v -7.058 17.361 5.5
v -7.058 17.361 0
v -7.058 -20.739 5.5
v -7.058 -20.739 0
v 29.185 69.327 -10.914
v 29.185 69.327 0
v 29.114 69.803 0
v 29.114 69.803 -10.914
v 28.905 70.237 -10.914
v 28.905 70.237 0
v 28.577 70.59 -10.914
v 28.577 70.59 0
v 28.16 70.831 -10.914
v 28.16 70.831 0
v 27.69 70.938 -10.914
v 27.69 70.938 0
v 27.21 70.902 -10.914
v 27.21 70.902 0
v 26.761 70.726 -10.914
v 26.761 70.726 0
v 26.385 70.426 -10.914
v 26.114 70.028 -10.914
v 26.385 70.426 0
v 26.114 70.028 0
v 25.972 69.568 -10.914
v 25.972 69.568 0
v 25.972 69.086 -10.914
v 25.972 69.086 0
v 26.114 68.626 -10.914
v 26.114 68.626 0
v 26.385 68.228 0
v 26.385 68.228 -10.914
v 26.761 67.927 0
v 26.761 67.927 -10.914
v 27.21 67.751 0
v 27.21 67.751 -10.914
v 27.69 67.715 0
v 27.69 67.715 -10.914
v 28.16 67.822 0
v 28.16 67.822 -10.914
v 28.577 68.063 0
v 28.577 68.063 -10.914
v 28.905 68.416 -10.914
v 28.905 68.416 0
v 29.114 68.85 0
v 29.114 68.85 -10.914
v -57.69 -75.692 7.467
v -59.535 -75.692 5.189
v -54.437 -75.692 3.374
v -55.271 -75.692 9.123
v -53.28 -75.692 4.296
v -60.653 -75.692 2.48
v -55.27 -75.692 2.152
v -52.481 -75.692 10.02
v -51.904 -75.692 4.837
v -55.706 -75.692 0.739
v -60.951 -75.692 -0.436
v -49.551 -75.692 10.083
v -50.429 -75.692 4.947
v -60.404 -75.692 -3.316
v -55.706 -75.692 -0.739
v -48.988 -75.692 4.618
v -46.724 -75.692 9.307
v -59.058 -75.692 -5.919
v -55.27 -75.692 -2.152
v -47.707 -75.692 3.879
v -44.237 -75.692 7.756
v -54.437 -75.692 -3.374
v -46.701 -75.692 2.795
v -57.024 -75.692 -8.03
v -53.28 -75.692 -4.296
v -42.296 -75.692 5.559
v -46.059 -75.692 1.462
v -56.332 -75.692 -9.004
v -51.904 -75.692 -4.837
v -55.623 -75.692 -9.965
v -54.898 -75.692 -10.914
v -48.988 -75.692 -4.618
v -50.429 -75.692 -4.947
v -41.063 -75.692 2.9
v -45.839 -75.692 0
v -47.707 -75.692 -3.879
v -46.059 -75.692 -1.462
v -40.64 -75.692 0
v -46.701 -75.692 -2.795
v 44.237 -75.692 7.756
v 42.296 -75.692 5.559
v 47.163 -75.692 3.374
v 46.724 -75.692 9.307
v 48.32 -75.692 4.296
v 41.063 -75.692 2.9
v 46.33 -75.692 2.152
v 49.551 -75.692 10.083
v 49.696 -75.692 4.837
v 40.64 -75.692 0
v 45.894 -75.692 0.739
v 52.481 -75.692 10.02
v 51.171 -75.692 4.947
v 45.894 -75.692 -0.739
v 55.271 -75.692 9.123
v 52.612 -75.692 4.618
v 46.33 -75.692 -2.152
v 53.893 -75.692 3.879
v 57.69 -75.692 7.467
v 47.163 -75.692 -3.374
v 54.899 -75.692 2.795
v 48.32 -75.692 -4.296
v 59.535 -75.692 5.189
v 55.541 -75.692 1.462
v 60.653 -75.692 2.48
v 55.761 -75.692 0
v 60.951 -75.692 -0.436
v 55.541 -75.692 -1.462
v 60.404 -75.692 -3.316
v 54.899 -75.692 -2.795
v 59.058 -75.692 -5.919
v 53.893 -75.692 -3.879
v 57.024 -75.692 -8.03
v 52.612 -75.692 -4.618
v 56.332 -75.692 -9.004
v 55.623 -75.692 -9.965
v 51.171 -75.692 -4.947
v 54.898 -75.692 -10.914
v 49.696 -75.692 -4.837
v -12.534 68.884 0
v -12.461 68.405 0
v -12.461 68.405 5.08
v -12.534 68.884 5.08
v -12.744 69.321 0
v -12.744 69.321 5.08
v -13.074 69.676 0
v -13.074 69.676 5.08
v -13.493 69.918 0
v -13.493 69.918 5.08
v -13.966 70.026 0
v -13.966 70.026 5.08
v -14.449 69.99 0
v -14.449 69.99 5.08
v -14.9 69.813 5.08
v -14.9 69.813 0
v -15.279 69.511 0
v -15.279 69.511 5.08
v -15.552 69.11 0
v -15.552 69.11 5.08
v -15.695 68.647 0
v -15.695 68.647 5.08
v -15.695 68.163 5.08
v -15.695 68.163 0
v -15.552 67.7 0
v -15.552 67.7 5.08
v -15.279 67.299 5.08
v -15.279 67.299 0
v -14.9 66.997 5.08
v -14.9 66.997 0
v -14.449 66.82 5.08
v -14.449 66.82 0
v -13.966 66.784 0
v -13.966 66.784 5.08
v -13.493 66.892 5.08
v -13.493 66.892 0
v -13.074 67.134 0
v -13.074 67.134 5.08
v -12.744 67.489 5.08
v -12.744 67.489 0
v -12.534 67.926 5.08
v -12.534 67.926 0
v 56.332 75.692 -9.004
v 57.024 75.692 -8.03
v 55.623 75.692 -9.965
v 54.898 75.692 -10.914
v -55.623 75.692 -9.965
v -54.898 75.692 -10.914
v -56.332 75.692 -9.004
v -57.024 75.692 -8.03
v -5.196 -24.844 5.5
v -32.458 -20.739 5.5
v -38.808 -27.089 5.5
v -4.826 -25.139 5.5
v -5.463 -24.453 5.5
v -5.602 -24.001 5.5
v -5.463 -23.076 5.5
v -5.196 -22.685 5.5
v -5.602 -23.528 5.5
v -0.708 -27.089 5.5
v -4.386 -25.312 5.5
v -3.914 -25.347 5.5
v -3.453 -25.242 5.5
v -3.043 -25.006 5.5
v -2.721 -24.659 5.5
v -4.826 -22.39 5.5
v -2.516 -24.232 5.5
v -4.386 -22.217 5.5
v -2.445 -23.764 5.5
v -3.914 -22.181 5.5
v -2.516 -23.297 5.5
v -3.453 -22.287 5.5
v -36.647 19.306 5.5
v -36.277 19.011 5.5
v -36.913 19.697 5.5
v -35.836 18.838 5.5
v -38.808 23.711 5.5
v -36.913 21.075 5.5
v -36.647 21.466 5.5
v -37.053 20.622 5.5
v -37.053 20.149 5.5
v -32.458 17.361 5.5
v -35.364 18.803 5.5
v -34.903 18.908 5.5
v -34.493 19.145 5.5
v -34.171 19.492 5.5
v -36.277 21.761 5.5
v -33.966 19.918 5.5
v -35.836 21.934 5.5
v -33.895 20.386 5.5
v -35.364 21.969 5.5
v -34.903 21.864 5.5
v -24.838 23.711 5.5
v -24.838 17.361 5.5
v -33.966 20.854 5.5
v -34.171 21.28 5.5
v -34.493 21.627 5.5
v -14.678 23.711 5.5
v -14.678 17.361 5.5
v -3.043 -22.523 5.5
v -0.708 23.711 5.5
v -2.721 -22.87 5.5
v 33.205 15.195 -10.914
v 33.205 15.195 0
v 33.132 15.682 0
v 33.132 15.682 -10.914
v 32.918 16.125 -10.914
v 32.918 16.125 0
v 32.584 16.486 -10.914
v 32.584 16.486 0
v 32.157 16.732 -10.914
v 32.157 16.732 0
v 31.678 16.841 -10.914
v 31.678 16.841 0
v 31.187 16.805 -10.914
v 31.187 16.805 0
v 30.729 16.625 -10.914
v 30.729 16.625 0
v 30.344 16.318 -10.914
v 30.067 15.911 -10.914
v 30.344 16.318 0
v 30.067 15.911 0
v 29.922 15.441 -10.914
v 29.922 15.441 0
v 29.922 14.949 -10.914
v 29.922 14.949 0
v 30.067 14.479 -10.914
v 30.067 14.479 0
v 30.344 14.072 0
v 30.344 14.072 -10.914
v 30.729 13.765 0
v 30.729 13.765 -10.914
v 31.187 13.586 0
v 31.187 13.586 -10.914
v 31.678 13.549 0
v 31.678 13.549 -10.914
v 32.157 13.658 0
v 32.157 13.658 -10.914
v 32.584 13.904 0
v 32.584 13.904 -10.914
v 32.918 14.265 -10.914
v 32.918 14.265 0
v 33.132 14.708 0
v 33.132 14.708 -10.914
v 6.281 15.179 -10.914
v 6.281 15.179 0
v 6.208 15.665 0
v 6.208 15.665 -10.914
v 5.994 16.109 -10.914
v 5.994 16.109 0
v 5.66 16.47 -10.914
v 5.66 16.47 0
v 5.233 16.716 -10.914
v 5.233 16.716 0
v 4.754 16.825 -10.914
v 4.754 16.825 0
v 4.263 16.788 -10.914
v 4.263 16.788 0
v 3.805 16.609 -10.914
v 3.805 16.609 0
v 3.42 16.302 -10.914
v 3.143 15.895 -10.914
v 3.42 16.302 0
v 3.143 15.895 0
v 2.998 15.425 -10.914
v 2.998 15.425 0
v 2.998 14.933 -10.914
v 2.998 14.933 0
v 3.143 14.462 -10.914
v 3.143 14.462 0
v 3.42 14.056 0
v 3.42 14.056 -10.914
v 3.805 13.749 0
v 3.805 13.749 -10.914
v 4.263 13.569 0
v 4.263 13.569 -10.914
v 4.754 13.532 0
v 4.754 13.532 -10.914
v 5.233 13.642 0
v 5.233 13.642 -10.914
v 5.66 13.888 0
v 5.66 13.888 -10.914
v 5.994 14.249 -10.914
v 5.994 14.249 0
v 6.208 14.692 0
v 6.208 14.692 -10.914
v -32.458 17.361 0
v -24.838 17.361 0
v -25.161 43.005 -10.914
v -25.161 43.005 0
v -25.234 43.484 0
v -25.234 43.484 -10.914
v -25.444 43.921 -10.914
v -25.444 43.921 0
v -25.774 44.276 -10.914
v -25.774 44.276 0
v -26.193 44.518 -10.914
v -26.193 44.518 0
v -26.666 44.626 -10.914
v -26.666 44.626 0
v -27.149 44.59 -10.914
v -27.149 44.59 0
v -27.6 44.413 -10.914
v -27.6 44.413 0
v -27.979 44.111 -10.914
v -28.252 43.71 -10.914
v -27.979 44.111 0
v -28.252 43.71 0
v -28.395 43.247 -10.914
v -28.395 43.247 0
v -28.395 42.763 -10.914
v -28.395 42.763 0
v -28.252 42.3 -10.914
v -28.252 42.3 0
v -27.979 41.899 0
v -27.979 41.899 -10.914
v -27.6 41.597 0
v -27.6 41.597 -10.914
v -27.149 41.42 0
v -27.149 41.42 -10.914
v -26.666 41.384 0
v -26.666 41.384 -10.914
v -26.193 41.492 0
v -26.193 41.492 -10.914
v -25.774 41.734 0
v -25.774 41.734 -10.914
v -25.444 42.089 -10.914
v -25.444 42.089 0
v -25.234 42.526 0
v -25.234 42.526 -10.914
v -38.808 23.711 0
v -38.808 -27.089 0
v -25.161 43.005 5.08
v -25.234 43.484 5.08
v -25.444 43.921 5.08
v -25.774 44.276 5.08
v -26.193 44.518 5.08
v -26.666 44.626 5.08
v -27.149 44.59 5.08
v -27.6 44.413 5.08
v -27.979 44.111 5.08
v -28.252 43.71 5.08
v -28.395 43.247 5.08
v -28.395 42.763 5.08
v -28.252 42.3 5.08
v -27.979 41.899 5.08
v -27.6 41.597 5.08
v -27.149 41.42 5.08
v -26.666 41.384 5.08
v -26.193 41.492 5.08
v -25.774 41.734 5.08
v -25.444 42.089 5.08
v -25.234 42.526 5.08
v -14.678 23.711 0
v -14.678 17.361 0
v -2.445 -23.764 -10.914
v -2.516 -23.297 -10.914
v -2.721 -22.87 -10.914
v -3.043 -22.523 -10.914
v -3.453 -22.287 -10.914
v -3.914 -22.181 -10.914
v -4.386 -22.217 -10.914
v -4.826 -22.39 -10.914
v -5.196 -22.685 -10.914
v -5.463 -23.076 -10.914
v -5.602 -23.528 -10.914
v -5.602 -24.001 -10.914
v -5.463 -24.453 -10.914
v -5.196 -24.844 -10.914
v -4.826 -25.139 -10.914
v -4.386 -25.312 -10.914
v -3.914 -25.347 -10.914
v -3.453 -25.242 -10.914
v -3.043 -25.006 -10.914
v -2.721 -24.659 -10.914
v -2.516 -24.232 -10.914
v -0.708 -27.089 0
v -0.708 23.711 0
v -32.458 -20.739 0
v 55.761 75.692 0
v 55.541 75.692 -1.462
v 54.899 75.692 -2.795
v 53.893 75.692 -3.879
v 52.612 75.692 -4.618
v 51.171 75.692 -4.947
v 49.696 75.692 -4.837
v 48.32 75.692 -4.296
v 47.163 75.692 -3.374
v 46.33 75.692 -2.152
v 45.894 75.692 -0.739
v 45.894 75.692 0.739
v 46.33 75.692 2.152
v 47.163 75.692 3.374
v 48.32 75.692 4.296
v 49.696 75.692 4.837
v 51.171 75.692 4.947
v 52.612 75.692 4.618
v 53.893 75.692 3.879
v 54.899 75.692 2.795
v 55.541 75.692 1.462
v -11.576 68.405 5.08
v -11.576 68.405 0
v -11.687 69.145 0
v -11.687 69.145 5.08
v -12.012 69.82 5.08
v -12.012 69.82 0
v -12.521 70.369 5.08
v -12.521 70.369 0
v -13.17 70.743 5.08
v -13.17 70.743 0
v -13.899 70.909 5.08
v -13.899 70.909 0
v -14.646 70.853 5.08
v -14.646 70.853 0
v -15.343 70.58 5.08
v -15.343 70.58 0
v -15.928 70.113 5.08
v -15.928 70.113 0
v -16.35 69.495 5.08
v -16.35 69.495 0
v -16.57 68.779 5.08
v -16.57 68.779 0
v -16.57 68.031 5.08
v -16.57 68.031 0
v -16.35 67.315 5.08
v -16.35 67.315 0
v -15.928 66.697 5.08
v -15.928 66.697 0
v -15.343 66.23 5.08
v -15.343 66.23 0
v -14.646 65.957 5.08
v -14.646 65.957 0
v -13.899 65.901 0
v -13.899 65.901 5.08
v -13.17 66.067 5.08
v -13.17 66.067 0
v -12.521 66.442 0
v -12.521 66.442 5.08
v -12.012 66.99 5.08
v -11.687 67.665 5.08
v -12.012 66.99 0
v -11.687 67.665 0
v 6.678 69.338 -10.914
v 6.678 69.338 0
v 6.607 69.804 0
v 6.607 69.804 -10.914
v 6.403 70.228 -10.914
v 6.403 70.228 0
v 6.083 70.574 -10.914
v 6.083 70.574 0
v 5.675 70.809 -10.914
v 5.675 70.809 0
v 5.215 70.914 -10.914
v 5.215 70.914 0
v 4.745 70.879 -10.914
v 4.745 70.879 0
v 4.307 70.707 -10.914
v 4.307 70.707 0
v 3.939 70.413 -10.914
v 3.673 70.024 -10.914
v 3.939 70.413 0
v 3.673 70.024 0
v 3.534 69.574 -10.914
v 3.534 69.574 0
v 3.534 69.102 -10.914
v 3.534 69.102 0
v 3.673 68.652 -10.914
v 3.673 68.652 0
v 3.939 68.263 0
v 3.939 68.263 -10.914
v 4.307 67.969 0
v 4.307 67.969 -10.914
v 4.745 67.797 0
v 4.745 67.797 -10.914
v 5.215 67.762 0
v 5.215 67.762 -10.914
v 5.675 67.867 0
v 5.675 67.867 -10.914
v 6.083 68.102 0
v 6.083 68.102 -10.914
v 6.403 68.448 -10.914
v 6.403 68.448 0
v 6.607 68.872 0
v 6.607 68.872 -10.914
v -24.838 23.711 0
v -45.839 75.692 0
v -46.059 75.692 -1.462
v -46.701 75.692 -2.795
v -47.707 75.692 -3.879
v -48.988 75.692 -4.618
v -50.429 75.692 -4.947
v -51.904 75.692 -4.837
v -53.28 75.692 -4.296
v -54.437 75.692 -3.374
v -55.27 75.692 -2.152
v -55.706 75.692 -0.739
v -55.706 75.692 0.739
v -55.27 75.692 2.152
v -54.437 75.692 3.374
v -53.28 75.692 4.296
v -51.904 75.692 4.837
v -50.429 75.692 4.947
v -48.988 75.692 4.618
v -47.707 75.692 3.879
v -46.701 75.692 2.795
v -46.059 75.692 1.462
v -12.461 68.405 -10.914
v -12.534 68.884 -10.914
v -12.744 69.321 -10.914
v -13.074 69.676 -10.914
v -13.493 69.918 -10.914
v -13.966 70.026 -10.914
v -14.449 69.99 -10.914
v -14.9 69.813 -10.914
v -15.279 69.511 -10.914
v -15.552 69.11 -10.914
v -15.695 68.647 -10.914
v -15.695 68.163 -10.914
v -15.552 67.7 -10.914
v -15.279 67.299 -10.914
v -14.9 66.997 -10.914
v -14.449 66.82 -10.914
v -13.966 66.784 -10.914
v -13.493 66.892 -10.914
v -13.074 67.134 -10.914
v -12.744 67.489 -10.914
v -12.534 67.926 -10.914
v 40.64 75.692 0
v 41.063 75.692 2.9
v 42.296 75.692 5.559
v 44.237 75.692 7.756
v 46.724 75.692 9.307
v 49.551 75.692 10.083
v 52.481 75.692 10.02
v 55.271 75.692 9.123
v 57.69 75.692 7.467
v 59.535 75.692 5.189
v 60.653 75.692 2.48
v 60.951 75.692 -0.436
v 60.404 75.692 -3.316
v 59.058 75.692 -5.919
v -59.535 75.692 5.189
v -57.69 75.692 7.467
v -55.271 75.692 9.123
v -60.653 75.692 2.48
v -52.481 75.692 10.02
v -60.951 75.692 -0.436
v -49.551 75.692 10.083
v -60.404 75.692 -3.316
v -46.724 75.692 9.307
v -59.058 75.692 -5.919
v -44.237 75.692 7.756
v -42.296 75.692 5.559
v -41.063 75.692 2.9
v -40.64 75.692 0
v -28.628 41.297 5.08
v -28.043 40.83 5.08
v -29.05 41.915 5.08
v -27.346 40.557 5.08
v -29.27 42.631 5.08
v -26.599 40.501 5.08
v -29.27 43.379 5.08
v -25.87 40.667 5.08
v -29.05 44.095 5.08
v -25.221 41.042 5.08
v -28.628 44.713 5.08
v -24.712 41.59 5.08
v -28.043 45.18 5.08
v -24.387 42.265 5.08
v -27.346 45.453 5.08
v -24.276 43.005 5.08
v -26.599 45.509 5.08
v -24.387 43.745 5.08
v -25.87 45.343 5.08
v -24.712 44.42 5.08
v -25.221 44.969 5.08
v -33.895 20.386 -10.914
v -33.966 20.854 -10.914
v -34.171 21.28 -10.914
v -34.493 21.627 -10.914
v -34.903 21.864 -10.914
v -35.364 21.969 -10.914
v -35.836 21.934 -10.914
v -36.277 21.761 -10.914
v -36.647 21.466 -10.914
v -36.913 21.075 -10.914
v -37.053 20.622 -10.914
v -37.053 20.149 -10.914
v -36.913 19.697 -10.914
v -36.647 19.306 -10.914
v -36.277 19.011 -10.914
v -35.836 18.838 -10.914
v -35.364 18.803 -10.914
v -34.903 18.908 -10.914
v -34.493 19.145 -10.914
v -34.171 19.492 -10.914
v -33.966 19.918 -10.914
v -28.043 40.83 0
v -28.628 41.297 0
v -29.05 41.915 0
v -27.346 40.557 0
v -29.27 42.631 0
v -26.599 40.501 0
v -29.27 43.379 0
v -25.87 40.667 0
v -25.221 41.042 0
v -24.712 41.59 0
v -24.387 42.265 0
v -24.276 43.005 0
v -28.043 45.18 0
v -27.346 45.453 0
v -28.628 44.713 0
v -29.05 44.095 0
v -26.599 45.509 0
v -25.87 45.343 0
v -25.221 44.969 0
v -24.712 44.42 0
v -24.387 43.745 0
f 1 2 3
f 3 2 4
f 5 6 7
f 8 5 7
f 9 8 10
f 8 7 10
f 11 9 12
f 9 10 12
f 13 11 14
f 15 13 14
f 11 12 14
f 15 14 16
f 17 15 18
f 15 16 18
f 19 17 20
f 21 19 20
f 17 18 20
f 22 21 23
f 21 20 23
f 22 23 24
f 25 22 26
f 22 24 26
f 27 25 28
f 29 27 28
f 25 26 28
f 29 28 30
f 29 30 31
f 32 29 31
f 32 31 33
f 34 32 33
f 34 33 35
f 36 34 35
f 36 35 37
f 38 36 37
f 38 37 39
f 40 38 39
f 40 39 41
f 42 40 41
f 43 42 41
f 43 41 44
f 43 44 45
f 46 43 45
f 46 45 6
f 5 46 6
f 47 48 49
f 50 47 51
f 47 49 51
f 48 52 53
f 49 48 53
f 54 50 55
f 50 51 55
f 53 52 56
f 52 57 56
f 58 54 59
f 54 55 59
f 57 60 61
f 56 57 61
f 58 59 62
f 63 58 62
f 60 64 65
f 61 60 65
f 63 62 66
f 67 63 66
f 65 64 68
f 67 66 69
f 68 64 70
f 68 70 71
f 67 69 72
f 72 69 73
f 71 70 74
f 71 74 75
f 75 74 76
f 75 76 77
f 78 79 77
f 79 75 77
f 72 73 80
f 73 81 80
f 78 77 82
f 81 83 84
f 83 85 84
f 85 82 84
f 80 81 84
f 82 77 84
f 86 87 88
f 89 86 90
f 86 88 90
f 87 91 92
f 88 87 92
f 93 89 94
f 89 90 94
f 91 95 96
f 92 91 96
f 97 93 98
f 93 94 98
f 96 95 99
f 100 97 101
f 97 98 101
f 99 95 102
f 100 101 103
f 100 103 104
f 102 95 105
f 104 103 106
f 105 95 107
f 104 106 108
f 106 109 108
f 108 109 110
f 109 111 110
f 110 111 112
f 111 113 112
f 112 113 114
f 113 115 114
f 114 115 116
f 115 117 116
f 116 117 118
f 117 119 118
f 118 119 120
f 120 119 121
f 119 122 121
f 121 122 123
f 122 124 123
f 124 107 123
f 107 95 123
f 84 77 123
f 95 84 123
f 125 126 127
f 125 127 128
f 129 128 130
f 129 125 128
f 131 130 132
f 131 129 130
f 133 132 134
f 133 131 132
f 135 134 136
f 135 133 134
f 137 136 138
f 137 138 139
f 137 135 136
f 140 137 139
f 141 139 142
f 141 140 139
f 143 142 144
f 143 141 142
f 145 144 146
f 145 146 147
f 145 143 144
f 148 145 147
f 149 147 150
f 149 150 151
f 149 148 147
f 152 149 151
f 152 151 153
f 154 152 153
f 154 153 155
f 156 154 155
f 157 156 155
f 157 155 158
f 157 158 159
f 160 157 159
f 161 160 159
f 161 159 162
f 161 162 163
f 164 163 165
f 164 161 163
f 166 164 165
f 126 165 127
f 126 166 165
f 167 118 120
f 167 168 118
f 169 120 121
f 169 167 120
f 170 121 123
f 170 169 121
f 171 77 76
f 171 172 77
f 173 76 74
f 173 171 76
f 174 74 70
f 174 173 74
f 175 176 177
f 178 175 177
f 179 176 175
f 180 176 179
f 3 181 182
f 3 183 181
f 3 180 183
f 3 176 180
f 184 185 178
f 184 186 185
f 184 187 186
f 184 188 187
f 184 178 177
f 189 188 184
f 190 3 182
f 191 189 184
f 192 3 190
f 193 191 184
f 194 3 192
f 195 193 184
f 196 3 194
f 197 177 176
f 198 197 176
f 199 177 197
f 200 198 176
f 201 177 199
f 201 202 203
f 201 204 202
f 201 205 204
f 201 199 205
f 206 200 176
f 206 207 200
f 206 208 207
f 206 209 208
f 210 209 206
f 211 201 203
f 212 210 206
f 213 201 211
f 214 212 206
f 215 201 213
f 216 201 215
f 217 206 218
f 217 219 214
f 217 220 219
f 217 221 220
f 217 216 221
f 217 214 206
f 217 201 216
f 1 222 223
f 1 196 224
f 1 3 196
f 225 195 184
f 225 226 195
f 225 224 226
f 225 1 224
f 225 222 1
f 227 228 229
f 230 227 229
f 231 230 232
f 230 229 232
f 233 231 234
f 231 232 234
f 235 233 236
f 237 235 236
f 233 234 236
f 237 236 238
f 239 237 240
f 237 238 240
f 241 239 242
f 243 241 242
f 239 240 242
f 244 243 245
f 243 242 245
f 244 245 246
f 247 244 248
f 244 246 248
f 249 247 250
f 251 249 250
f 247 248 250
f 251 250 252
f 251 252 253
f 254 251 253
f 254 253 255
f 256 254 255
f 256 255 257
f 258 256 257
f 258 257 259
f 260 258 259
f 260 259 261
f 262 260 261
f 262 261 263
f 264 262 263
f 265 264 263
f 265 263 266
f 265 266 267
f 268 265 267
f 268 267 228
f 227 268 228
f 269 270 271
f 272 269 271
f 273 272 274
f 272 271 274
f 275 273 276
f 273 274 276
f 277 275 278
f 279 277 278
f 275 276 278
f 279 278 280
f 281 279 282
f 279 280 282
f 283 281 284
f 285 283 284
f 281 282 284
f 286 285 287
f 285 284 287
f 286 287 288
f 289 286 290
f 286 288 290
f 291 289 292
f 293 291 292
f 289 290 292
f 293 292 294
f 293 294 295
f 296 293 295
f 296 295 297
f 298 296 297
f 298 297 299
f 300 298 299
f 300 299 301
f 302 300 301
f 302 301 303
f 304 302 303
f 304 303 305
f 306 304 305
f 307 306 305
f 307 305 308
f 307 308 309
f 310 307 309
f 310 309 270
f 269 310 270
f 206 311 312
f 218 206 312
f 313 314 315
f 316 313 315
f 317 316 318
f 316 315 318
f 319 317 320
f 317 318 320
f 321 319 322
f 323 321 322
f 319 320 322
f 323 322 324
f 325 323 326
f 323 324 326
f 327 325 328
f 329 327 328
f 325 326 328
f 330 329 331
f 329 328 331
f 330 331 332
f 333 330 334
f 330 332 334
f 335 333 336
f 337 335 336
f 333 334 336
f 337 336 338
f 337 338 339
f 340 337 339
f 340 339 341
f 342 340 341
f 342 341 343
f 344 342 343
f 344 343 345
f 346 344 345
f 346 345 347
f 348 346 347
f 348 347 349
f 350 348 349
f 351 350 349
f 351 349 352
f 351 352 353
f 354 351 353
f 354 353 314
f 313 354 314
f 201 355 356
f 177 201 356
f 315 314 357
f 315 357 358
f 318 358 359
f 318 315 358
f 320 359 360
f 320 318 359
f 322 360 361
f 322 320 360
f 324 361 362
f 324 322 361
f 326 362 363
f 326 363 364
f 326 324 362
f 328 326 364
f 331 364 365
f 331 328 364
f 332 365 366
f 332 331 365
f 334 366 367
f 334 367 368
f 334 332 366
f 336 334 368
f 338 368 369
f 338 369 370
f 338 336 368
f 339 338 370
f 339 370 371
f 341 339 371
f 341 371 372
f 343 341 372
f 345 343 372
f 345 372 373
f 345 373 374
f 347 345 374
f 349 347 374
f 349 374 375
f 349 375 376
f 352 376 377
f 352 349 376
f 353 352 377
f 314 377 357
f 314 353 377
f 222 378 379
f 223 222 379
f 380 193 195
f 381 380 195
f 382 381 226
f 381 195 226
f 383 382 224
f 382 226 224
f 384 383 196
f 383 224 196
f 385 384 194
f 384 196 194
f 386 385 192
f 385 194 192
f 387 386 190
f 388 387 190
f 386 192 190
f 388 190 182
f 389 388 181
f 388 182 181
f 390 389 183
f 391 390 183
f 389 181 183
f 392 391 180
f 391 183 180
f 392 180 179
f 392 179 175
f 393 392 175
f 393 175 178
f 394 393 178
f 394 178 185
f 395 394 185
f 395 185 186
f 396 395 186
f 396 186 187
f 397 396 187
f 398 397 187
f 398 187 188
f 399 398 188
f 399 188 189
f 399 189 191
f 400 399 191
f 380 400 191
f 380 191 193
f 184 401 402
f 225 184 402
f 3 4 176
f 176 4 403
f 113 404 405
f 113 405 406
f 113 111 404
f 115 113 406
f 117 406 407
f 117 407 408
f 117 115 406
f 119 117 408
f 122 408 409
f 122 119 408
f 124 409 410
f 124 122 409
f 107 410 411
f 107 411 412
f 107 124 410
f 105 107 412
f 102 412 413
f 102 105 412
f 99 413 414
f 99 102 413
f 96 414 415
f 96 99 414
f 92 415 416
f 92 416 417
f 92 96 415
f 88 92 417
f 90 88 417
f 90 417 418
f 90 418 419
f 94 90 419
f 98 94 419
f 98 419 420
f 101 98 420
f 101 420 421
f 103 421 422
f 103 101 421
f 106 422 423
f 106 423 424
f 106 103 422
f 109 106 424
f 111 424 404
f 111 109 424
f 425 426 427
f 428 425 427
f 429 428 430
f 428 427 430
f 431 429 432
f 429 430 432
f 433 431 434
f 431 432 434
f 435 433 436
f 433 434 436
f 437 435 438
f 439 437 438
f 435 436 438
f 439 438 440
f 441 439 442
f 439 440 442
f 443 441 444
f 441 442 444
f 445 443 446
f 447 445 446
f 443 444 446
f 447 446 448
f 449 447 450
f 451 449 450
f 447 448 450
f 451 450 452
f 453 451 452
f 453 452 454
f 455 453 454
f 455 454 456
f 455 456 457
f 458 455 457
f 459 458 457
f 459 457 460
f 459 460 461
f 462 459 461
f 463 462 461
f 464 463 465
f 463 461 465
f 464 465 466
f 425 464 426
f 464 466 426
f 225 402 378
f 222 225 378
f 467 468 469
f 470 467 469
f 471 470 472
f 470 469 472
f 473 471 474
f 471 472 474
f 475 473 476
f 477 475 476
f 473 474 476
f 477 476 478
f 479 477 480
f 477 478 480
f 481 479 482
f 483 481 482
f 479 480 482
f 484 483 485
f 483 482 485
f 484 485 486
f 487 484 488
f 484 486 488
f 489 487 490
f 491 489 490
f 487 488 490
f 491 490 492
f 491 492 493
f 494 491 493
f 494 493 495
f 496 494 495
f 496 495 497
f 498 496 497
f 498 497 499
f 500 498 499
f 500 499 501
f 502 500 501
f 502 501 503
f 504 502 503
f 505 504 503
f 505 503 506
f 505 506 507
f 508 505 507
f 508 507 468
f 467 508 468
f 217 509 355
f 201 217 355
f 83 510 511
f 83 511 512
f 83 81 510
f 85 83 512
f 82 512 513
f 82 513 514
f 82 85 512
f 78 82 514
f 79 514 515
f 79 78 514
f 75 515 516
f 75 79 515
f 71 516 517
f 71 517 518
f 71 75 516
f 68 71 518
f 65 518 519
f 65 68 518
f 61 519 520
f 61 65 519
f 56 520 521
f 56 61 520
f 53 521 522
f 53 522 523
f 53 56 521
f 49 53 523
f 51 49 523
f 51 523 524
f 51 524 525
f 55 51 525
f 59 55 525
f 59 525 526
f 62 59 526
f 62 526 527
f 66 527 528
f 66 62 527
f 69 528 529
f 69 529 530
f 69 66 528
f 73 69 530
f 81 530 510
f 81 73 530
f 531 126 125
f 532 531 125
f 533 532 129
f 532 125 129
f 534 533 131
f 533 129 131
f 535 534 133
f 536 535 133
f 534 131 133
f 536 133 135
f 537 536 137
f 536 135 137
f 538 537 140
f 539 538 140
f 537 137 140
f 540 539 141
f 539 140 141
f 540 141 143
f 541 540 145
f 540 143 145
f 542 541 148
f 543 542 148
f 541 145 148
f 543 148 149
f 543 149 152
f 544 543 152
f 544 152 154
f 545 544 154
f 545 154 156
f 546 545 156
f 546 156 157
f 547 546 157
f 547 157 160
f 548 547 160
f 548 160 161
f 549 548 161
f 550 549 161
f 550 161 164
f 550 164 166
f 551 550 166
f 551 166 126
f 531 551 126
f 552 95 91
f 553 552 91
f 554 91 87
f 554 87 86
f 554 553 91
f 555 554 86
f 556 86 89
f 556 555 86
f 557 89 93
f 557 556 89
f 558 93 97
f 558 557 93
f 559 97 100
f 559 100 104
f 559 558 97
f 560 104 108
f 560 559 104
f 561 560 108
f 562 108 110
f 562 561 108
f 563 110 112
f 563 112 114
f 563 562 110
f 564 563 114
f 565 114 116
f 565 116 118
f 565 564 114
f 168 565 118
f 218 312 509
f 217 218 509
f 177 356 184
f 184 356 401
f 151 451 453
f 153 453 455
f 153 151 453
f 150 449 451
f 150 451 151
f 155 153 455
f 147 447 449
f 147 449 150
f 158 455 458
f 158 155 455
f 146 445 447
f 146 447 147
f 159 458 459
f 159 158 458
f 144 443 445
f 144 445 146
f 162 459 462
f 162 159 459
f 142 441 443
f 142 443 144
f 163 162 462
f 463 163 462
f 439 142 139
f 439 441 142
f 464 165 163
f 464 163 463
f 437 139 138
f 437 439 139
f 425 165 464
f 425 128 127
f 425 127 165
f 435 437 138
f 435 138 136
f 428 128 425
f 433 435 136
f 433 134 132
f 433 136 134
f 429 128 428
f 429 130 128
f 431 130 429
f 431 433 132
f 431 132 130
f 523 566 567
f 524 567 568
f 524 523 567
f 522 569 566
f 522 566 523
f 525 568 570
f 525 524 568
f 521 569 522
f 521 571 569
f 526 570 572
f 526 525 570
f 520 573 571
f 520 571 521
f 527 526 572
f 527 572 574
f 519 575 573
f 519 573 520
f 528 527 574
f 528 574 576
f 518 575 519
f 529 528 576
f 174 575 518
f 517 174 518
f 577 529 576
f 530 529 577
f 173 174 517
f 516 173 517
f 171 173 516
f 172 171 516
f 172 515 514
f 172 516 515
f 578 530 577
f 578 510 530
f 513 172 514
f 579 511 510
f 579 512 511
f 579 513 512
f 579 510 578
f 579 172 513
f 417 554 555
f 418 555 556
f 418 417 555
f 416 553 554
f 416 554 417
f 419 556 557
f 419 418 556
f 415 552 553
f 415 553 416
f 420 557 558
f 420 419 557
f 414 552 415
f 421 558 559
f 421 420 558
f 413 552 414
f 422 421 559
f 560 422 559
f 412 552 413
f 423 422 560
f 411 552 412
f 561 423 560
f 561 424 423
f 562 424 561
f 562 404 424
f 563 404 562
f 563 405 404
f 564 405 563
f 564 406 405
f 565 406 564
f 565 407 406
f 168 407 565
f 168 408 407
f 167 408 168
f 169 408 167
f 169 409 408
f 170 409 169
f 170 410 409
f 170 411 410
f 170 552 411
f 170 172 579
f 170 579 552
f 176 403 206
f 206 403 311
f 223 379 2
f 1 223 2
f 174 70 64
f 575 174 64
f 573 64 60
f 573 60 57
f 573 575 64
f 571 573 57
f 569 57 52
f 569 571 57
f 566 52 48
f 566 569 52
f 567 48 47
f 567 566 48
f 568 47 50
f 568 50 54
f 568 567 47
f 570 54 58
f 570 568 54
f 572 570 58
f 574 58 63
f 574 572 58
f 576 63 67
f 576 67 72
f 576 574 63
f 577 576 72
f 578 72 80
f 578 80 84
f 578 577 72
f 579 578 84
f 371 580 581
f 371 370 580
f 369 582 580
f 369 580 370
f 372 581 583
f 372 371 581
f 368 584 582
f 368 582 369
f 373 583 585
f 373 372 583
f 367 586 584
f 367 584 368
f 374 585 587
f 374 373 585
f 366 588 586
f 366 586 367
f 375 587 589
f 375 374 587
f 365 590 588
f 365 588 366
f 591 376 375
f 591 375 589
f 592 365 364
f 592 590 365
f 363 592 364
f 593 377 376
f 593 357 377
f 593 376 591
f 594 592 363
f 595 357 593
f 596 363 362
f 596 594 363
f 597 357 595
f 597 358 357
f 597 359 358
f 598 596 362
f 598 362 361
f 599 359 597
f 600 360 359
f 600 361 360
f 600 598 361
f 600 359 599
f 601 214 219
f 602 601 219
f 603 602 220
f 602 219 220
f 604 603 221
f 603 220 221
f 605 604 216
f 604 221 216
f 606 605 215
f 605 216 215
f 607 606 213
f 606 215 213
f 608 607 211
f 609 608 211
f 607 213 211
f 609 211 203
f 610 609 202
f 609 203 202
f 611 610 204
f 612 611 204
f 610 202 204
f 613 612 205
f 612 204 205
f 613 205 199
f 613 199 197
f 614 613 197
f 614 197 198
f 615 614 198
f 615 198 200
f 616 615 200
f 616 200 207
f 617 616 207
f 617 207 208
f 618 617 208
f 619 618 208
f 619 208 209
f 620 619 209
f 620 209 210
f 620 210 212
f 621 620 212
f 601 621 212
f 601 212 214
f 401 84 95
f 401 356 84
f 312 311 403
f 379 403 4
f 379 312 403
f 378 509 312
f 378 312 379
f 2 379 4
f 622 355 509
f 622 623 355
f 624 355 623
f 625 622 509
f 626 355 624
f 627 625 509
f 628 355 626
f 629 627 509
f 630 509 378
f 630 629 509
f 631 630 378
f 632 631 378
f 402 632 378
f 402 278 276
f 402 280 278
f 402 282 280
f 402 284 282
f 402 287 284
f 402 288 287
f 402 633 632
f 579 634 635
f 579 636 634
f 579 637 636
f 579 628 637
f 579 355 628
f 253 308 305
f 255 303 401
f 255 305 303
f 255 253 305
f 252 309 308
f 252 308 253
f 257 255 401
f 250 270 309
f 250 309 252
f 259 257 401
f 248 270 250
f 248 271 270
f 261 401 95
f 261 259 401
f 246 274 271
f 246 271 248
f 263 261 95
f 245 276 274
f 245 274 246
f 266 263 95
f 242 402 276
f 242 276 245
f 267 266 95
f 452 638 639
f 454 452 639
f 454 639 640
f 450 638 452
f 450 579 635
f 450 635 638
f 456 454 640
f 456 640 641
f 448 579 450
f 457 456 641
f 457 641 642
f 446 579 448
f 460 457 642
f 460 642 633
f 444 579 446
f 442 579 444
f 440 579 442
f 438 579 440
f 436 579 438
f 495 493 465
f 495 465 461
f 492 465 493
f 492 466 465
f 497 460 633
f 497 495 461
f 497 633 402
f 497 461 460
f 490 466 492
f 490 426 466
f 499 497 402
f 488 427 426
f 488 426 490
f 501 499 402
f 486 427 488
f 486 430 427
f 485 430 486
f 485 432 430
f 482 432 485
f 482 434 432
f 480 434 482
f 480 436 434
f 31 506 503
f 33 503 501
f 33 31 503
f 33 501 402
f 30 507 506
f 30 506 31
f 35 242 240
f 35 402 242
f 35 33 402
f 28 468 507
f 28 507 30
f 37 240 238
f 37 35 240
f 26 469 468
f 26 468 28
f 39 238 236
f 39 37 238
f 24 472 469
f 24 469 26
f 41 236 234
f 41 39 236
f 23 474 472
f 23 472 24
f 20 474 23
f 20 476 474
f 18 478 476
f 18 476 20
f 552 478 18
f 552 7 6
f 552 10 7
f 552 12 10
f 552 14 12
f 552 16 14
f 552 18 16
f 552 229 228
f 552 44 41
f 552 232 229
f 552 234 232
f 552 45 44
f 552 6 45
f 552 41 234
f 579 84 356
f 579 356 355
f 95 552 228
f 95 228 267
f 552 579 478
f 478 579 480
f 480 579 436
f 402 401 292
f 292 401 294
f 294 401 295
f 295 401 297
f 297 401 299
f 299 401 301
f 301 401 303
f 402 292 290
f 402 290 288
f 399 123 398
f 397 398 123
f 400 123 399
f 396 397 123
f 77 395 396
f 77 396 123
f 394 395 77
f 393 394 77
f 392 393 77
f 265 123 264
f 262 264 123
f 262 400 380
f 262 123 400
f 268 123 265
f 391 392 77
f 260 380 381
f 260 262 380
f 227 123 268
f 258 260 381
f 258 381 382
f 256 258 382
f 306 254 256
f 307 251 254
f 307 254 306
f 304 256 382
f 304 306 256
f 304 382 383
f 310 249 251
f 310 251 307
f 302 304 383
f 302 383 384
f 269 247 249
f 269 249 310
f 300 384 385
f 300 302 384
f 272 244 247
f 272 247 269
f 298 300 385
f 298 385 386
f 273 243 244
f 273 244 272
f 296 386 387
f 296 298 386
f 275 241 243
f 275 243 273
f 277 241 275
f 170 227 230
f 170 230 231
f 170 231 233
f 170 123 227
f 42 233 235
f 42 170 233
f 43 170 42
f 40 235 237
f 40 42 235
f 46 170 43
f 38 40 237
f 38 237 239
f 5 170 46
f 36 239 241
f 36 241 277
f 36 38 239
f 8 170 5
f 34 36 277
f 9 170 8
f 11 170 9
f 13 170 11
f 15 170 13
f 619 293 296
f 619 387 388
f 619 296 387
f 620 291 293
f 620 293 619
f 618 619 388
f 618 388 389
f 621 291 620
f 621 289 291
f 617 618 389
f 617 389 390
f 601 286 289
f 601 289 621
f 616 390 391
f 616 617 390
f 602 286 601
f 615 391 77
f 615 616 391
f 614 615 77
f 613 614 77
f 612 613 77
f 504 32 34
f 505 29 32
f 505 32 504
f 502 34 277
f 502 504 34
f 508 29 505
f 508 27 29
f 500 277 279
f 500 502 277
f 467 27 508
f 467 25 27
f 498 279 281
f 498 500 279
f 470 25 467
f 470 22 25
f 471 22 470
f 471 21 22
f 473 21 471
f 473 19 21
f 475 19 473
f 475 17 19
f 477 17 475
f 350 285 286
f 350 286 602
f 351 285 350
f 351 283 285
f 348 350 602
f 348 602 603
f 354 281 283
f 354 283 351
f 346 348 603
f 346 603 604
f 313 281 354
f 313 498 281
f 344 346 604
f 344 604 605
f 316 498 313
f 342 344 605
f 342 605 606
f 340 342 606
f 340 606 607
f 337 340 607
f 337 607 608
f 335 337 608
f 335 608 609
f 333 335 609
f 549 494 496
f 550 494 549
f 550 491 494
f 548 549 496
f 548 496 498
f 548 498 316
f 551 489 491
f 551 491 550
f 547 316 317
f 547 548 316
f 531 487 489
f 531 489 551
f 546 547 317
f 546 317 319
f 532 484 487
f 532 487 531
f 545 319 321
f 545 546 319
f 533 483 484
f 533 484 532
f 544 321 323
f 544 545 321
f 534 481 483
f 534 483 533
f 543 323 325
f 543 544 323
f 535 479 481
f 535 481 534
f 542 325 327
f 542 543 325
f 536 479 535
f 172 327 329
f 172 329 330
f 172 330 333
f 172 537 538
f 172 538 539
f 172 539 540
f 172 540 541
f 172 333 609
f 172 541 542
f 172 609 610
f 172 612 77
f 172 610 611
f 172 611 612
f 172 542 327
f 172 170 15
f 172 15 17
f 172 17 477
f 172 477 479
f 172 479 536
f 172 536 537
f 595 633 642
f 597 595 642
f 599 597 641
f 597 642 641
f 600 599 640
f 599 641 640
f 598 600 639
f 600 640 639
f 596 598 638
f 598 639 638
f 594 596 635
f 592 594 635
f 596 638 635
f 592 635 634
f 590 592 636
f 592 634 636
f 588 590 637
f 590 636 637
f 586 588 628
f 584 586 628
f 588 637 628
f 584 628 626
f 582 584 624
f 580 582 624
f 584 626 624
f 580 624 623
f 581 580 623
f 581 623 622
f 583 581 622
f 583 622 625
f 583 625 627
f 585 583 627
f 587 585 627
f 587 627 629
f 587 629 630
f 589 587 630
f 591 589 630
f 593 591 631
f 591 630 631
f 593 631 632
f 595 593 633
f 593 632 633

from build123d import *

# Parameters (mm, degrees)
SKETCH1_R           = 4.9609375
BOSS_EXTRUDE1_DEPTH = 75.692
SKETCH3_R           = 1.6256
CUT_EXTRUDE1_DEPTH  = 98.798395582
BOSS_EXTRUDE2_START = 5.08
SKETCH3_3_R         = 2.511415146
SKETCH3_3_R_2       = 1.6256
BOSS_EXTRUDE2_DEPTH = 5.08
SKETCH4_R           = 1.580559699
SKETCH4_R_2         = 1.615968851
SKETCH4_R_3         = 1.651
CUT_EXTRUDE2_DEPTH  = 98.798395582
BOSS_EXTRUDE3_DEPTH = 5.500116
SKETCH6_R           = 1.5875
CUT_EXTRUDE3_DEPTH  = 99.563883783


with BuildPart() as part:
    # Sketch1 → Boss-Extrude1 (new, symmetric)
    with BuildSketch(Plane(origin=(0, 0, 0), x_dir=(1, 0, 0), z_dir=(0, 1, 0))):
        with BuildLine():
            ThreePointArc((-54.898232946, 10.914472708), (-55.979756859, 9.486084273), (-57.024125462, 8.030308975))
            ThreePointArc((-57.024125462, 8.030308975), (-55.271492218, -9.123122127), (-40.64, 0))
            Line((-40.64, 0), (40.64, 0))
            ThreePointArc((40.64, 0), (55.271492218, -9.123122127), (57.024125462, 8.030308975))
            ThreePointArc((57.024125462, 8.030308975), (55.979756859, 9.486084273), (54.898232946, 10.914472708))
            Line((54.898232946, 10.914472708), (-54.898232946, 10.914472708))
        make_face()
        with Locations((-50.8, 0)):
            Circle(SKETCH1_R, mode=Mode.SUBTRACT)
        with Locations((50.8, 0)):
            Circle(SKETCH1_R, mode=Mode.SUBTRACT)
    extrude(amount=BOSS_EXTRUDE1_DEPTH, both=True)

    # Sketch3 → Cut-Extrude1 (cut, through all)
    with BuildSketch(Plane.XY):
        with Locations((-14.08707582, 68.405041605)):
            Circle(SKETCH3_R)
        with Locations((-26.78707582, 43.005041605)):
            Circle(SKETCH3_R)
    extrude(amount=-CUT_EXTRUDE1_DEPTH, mode=Mode.SUBTRACT)

    # Sketch3<3> → Boss-Extrude2 (add)
    # profile 1 of 2: a face of its own
    with BuildSketch(Plane.XY.offset(BOSS_EXTRUDE2_START)):
        with Locations((-14.08707582, 68.405041605)):
            Circle(SKETCH3_3_R)
        with Locations((-14.08707582, 68.405041605)):
            Circle(SKETCH3_3_R_2, mode=Mode.SUBTRACT)
    # profile 2 of 2: a face of its own
    with BuildSketch(Plane.XY.offset(BOSS_EXTRUDE2_START)):
        with Locations((-26.78707582, 43.005041605)):
            Circle(SKETCH3_3_R)
        with Locations((-26.78707582, 43.005041605)):
            Circle(SKETCH3_3_R_2, mode=Mode.SUBTRACT)
    extrude(amount=-BOSS_EXTRUDE2_DEPTH)

    # Sketch4 → Cut-Extrude2 (cut, through all)
    with BuildSketch(Plane.XY):
        with Locations((5.097142458, 69.338036856)):
            Circle(SKETCH4_R)
        with Locations((27.569466172, 69.326708036)):
            Circle(SKETCH4_R_2)
        with Locations((4.630258258, 15.178805596)):
            Circle(SKETCH4_R_3)
        with Locations((31.55425332, 15.195112998)):
            Circle(SKETCH4_R_3)
    extrude(amount=-CUT_EXTRUDE2_DEPTH, mode=Mode.SUBTRACT)

    # Sketch5 → Boss-Extrude3 (add)
    with BuildSketch(Plane.XY):
        Polygon((-32.457787853, 17.360692428), (-24.837787853, 17.360692428), (-24.837787853, 23.710692428), (-38.807787853, 23.710692428), (-38.807787853, -27.089307572), (-0.707787853, -27.089307572), (-0.707787853, 23.710692428), (-14.677787853, 23.710692428), (-14.677787853, 17.360692428), (-7.057787853, 17.360692428), (-7.057787853, -20.739307572), (-32.457787853, -20.739307572), align=None)
    extrude(amount=BOSS_EXTRUDE3_DEPTH)

    # Sketch6 → Cut-Extrude3 (cut, through all)
    with BuildSketch(Plane.XY.offset(5.500116)):
        with Locations((-35.482909848, 20.385814423)):
            Circle(SKETCH6_R)
        with Locations((-4.032665858, -23.764429567)):
            Circle(SKETCH6_R)
    extrude(amount=-CUT_EXTRUDE3_DEPTH, mode=Mode.SUBTRACT)


solid = part.part
